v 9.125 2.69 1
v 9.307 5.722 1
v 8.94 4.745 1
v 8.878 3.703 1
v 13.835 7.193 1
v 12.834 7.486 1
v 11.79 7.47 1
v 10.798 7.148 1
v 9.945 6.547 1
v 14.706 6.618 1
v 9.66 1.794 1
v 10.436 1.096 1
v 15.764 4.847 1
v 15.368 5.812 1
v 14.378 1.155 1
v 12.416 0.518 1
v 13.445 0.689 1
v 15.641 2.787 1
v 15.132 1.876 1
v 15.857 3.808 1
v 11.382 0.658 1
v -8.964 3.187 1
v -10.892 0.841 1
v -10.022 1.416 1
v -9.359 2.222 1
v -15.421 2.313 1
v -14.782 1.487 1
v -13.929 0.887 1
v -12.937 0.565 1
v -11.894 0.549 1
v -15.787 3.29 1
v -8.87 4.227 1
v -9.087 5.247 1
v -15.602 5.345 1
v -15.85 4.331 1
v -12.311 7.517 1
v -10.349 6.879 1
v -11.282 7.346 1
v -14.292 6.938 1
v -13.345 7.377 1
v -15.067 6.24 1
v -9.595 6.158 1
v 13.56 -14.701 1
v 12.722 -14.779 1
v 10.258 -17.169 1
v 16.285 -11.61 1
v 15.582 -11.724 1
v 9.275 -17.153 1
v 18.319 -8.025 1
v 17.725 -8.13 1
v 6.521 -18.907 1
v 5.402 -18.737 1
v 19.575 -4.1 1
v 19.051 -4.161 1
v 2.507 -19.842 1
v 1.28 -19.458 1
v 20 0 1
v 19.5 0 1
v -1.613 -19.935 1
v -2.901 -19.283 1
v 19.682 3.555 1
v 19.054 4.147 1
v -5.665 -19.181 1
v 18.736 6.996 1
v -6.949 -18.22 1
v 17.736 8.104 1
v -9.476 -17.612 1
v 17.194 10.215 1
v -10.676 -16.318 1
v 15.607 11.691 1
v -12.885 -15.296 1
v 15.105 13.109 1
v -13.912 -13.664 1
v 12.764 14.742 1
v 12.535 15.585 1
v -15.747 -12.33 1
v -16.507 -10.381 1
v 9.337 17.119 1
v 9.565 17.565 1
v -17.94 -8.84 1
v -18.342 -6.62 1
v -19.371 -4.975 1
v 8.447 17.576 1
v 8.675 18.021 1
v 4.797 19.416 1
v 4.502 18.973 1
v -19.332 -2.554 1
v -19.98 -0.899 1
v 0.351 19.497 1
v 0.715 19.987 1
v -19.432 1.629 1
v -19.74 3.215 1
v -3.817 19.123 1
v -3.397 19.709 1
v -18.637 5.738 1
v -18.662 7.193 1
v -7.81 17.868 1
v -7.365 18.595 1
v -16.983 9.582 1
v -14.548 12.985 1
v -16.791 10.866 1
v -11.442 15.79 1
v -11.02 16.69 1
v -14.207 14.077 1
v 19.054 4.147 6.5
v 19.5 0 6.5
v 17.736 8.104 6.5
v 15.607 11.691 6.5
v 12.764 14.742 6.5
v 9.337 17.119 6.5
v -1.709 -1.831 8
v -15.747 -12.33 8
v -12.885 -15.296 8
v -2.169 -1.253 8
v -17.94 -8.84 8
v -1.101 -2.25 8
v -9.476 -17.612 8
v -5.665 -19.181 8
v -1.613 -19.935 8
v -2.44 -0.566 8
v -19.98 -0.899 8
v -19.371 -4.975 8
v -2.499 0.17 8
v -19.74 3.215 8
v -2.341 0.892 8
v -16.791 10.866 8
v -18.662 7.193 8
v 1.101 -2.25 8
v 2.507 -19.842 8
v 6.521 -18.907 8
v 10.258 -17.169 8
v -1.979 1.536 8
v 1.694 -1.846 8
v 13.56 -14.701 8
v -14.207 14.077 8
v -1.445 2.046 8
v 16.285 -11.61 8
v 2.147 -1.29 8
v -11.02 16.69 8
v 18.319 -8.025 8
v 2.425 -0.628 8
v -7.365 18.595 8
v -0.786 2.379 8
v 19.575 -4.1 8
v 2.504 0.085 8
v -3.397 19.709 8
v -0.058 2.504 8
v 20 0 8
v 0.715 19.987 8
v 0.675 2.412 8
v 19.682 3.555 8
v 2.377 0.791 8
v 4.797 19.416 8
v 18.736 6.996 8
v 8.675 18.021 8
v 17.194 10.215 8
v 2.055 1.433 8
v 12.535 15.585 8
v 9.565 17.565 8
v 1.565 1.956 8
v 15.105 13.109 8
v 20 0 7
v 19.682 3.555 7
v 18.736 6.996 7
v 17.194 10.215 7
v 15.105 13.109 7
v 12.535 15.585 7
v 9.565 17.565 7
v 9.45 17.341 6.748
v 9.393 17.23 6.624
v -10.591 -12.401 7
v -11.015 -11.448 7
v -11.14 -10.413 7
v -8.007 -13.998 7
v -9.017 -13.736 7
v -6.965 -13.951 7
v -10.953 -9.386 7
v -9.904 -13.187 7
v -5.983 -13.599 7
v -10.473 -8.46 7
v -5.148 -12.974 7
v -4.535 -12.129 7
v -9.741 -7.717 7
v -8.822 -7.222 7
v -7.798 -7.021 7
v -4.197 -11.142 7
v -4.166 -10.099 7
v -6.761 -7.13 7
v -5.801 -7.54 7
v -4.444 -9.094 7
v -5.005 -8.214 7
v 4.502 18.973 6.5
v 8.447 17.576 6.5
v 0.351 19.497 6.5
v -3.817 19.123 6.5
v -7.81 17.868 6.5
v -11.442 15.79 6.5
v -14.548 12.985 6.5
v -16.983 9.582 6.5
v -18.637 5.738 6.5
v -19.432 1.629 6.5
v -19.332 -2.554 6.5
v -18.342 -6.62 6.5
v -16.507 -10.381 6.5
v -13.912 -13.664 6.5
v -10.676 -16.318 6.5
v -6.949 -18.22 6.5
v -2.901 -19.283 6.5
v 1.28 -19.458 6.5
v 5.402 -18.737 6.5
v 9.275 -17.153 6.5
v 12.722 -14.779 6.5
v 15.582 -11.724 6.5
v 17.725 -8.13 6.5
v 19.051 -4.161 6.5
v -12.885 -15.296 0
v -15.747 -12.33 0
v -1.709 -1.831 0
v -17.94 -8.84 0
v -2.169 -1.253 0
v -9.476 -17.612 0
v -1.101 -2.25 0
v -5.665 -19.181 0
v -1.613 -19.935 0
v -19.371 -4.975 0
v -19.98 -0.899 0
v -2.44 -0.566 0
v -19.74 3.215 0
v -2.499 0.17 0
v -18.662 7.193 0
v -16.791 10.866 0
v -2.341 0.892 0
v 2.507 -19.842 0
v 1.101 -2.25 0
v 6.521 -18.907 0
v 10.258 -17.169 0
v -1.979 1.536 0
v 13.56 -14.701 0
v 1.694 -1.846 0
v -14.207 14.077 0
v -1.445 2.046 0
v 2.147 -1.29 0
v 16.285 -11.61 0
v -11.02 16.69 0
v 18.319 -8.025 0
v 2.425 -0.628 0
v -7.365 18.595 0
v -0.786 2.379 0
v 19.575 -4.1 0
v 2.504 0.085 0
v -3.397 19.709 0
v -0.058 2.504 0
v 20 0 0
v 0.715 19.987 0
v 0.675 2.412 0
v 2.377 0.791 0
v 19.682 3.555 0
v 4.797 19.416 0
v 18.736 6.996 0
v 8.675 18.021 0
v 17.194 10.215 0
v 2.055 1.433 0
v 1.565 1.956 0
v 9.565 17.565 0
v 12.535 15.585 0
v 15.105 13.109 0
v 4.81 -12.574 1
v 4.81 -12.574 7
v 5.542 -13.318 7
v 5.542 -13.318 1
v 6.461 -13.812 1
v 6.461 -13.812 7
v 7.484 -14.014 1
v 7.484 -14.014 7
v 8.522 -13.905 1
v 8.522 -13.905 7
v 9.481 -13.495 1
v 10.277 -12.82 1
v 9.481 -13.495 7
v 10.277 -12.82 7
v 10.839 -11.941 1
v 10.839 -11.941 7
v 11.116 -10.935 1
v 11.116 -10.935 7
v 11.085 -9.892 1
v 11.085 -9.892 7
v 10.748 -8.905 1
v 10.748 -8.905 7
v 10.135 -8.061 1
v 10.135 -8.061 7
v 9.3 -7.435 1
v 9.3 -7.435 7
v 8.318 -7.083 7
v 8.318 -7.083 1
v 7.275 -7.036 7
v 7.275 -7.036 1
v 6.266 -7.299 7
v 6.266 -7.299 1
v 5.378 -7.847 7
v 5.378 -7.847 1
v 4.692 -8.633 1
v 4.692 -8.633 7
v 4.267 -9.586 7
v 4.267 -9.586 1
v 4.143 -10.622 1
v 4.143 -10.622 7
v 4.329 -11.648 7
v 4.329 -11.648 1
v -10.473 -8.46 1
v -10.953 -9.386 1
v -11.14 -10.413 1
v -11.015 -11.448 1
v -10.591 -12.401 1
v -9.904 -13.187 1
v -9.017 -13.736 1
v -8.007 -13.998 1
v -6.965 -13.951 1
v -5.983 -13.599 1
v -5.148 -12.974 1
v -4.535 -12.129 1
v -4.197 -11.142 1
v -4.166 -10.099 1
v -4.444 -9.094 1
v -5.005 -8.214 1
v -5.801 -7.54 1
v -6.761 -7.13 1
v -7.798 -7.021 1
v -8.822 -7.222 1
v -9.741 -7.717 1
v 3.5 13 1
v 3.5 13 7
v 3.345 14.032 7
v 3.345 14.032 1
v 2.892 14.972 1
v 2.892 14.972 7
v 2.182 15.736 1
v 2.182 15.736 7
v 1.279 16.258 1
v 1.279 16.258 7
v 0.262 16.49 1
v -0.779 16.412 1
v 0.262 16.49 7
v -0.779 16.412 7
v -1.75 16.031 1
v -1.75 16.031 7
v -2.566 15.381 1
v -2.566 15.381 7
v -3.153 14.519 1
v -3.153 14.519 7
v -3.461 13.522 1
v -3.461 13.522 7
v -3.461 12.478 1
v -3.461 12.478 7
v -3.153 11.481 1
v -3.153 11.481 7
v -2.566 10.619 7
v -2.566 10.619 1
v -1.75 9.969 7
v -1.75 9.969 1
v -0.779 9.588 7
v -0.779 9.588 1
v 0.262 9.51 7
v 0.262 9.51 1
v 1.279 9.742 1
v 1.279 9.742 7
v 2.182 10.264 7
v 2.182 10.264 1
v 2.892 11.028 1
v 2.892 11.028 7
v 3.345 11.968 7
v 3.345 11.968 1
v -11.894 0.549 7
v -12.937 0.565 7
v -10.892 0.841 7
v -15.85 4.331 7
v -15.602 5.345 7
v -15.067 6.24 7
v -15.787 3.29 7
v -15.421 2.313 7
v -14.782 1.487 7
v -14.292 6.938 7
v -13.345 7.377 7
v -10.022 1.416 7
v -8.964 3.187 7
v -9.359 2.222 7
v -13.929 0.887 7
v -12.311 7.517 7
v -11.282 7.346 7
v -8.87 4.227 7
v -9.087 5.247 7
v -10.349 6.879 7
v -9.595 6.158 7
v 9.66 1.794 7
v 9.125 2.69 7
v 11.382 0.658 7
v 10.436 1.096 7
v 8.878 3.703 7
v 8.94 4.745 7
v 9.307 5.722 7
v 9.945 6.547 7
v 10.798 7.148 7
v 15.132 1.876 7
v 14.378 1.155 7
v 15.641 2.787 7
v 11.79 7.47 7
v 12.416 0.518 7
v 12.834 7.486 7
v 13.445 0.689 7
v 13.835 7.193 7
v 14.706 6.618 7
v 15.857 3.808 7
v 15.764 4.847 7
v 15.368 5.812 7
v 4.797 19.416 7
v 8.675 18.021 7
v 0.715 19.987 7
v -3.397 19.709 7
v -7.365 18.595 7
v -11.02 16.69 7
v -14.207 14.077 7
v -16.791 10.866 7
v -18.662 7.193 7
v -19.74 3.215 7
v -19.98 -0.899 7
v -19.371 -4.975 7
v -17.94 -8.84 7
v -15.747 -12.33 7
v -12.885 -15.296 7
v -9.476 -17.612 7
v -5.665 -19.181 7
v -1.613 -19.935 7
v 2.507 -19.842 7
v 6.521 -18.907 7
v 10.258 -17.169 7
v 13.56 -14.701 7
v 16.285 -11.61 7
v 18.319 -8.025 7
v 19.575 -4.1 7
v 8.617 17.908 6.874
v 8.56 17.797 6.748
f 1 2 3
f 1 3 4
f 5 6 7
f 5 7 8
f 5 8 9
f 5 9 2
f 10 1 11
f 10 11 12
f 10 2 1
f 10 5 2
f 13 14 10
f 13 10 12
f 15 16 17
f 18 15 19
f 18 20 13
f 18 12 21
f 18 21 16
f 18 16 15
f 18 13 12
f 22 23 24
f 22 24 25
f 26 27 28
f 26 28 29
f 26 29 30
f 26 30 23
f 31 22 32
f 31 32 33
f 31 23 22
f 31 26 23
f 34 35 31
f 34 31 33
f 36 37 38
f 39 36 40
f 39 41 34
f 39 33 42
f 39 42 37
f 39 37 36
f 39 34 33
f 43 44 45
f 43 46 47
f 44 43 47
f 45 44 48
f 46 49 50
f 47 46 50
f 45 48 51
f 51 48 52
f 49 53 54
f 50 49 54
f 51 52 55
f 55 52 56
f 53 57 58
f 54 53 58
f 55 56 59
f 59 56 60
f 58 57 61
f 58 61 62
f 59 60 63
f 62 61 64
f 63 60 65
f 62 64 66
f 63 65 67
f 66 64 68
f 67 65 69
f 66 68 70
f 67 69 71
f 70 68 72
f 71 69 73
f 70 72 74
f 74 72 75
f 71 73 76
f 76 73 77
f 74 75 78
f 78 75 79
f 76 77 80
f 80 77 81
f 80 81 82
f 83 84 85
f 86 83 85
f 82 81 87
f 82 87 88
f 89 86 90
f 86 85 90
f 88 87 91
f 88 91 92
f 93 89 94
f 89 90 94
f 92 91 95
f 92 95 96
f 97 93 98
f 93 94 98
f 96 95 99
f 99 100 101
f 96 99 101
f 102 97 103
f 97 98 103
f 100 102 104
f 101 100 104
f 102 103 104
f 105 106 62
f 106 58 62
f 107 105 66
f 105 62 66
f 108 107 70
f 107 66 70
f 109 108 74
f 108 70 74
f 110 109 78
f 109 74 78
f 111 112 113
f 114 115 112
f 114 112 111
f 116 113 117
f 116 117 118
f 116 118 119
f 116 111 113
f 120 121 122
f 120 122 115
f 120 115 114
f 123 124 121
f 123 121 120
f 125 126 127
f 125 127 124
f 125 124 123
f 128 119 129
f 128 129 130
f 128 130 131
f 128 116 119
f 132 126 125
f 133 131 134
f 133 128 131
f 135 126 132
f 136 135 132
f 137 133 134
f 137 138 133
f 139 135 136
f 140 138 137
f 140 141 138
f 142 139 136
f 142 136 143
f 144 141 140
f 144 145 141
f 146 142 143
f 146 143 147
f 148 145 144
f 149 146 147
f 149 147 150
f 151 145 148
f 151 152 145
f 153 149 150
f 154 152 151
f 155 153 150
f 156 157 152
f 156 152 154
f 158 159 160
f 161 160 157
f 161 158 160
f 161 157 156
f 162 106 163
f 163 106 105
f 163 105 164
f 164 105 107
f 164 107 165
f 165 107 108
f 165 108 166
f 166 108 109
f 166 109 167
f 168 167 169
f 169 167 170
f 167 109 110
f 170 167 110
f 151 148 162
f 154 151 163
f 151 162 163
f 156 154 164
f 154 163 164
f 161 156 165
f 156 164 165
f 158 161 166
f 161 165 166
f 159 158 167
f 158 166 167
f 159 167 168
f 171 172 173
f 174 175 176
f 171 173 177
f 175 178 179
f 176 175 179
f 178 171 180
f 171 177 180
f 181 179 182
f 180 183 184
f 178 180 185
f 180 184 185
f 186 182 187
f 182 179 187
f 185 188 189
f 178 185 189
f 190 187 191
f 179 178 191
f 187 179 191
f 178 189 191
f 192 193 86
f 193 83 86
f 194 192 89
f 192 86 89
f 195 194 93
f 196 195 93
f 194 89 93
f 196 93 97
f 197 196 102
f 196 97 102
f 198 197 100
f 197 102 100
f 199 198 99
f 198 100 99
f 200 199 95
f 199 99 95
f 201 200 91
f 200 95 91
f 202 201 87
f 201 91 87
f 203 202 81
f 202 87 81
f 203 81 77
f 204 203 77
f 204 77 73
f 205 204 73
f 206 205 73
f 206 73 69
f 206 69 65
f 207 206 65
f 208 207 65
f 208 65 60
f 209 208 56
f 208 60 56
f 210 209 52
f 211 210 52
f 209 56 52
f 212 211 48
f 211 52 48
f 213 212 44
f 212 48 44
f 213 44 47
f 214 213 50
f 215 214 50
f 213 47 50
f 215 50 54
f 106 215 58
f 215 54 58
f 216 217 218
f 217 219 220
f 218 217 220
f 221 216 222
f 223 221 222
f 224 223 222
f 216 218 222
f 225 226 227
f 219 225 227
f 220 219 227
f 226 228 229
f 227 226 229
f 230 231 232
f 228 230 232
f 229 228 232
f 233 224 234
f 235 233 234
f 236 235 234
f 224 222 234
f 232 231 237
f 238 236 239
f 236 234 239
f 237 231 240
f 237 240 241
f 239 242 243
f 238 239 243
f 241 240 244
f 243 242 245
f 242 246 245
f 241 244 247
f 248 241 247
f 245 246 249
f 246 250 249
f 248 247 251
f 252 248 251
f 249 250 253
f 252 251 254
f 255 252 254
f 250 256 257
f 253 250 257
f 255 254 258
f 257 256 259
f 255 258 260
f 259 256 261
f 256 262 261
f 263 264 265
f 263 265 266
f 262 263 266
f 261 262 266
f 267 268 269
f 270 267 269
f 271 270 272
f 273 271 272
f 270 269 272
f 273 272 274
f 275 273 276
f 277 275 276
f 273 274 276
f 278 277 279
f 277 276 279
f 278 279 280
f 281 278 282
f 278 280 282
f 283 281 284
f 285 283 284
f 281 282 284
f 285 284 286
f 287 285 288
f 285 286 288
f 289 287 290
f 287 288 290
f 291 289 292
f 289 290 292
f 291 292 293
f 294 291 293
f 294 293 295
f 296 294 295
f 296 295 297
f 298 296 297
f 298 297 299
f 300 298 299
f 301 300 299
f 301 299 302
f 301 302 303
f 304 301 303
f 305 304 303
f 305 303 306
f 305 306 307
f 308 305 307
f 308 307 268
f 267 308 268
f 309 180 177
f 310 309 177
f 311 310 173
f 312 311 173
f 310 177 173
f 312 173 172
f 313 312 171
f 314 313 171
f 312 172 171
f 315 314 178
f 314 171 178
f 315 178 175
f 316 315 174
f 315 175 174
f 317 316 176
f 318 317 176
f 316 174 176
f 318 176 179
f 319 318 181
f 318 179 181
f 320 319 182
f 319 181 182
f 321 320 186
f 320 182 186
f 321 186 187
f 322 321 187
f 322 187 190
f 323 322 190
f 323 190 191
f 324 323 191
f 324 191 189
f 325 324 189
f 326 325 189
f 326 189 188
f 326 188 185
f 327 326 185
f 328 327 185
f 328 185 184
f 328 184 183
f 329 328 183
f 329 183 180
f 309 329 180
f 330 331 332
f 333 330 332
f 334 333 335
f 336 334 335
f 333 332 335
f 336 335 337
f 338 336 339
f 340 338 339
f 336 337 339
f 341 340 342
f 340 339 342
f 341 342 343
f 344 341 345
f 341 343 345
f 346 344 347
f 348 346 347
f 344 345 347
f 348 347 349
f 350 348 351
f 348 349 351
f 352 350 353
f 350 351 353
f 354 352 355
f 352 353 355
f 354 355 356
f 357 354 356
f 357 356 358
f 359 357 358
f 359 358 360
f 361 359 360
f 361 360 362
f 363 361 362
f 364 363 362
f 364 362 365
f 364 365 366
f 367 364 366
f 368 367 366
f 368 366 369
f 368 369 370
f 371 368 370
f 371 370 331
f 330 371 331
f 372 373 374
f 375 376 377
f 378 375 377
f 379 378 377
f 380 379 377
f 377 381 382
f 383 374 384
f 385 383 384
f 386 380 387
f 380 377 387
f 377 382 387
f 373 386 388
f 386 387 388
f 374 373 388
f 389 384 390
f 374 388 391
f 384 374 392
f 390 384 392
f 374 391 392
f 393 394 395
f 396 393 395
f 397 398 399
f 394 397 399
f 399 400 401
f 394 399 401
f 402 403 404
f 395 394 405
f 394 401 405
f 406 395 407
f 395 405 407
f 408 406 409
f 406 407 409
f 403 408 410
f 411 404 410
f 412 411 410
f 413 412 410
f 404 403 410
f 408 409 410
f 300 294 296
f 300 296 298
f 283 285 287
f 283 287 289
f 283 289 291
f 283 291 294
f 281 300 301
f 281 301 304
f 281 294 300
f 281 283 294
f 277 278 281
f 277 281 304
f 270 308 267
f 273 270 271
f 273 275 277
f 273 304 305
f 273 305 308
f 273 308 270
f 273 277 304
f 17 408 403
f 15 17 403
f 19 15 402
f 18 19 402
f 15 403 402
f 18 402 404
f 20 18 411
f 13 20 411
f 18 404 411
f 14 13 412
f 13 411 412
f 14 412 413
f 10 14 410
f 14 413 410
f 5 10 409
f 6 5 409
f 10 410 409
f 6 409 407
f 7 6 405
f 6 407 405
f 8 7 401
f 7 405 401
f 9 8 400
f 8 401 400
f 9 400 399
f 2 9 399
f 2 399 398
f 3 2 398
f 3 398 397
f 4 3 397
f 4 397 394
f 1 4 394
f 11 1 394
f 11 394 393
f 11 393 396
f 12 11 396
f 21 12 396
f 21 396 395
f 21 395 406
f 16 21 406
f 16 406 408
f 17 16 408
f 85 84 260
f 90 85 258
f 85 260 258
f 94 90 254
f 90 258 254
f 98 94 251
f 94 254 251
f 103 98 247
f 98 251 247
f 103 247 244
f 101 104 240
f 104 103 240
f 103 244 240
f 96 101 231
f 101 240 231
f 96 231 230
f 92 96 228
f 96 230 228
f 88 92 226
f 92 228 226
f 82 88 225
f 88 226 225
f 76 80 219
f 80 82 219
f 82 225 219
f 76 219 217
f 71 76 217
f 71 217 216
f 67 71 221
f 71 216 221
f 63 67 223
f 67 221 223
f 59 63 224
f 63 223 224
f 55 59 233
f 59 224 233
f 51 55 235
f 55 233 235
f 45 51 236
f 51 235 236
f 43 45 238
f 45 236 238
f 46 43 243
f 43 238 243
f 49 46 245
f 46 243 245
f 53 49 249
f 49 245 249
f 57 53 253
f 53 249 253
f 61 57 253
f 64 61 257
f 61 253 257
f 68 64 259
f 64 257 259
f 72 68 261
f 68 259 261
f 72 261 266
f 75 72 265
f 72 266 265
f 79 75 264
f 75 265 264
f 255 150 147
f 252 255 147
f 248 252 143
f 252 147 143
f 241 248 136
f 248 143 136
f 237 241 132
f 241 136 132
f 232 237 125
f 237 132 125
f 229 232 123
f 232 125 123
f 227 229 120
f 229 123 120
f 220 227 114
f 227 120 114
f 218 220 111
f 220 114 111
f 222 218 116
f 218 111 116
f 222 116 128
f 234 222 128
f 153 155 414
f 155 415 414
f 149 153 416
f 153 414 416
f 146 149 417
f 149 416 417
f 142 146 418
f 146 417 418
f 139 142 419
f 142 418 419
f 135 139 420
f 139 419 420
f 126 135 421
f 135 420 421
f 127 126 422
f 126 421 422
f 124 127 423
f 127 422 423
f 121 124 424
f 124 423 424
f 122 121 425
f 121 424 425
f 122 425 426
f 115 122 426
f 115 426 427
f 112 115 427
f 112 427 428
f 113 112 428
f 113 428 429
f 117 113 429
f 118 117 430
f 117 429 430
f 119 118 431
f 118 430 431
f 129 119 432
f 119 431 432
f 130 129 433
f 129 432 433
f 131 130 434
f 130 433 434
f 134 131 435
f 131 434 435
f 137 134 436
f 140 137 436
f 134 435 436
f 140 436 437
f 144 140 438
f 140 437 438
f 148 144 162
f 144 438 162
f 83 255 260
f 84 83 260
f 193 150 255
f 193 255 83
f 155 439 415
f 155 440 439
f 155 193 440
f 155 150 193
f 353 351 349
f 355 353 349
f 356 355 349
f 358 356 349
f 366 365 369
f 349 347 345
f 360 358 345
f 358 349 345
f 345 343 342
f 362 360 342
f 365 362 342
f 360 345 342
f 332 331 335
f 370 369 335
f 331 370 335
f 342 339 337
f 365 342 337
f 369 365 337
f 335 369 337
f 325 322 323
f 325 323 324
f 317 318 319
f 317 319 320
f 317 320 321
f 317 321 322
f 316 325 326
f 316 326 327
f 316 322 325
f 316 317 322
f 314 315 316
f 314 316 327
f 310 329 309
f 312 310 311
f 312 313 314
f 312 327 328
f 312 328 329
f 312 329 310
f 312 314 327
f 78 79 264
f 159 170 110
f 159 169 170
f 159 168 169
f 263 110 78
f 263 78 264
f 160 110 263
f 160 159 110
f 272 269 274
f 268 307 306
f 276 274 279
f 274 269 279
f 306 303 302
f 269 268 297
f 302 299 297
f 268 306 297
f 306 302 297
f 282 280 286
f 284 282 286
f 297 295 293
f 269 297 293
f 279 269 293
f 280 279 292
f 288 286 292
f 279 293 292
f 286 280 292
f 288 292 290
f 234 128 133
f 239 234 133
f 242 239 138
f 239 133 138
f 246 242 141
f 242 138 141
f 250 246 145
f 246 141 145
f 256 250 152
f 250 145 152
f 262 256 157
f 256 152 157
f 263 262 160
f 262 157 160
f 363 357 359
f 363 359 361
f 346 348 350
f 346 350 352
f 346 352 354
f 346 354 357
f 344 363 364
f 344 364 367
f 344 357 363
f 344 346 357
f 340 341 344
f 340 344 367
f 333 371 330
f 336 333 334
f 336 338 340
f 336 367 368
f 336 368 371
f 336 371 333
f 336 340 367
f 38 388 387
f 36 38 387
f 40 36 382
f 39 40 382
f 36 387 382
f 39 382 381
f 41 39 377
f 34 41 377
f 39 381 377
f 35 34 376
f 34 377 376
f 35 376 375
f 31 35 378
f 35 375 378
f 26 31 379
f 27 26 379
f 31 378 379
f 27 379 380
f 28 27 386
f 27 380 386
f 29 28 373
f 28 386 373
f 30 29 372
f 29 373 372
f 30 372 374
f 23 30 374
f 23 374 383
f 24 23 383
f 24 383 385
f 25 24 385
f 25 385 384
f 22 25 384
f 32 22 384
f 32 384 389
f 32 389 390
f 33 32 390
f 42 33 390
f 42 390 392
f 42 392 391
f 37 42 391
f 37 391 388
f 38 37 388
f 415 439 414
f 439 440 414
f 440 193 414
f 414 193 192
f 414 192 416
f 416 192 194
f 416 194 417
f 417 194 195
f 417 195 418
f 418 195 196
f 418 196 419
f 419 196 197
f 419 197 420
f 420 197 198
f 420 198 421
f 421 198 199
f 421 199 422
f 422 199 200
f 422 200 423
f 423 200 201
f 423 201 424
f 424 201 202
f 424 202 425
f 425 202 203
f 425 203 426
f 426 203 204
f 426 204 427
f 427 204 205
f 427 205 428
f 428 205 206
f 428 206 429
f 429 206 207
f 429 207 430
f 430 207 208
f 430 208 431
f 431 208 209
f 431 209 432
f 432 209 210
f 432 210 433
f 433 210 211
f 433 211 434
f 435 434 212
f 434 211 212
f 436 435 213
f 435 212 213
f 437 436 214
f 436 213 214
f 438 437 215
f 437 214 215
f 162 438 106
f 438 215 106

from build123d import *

# Parameters (mm, degrees)
SKETCH_R           = 20
PAD_DEPTH          = 8
POCKET_DEPTH       = 8.001
SKETCH003_R        = 3.5
POCKET001_DEPTH    = 7
POLARPATTERN_COUNT = 5
SKETCH005_R        = 1.995724
POCKET002_DEPTH    = 0.5
SKETCH007_R        = 17.476315
SKETCH007_R_2      = 3.403878
PAD001_DEPTH       = 1
POCKET003_DEPTH    = 8.001


with BuildPart() as part:
    # Sketch → Pad (new body)
    with BuildSketch(Plane.XY):
        Circle(SKETCH_R)
    extrude(amount=PAD_DEPTH)

    # Sketch001 (on Face3 of Pad) → Pocket (cut, through all)
    with BuildSketch(Plane.XY.offset(8)):
        with BuildLine():
            ThreePointArc((1.101147, -2.25), (0, 2.505), (-1.101147, -2.25))
            Line((-1.101147, -2.25), (1.101147, -2.25))
        make_face()
    extrude(amount=-POCKET_DEPTH, mode=Mode.SUBTRACT)

    # Sketch002 → Groove (revolve, cut)
    with BuildSketch(Plane.XZ):
        Polygon((19.5, 6.5), (19.5, 1), (23, 1), (23, 10), align=None)
    revolve(axis=Axis((0, 0, 0), (0, 0, 1)), mode=Mode.SUBTRACT)

    # Sketch003 (on Face3 of Groove) → Pocket001 (cut)
    with BuildSketch(Plane.XY.offset(8)):
        with Locations((0, 13)):
            Circle(SKETCH003_R)
    pocket001 = extrude(amount=-POCKET001_DEPTH, mode=Mode.SUBTRACT)

    # PolarPattern: Pocket001 ×5 about axis
    polarpattern_axis = Axis((0, 0, 8), (0, 0, 1))
    for i in range(1, POLARPATTERN_COUNT):
        add(pocket001.rotate(polarpattern_axis, i * 360 / POLARPATTERN_COUNT), mode=Mode.SUBTRACT)

    # Sketch005 (on Face3 of PolarPattern) → Pocket002 (cut)
    with BuildSketch(Plane.XY.offset(8)):
        with Locations((-5.881012, 7.168965)):
            Circle(SKETCH005_R)
    extrude(amount=-POCKET002_DEPTH, mode=Mode.SUBTRACT)

    # Sketch007 (on Face3 of Pocket002) → Pad001 (join)
    with BuildSketch(Plane.XY.offset(8)):
        Circle(SKETCH007_R)
        Circle(SKETCH007_R_2, mode=Mode.SUBTRACT)
    extrude(amount=-PAD001_DEPTH)

    # Sketch008 (on Face5 of Pad001) → Pocket003 (cut, through all)
    with BuildSketch(Plane.XY.offset(8)):
        Polygon((0, 0), (-0.444954, 0.22807), (10.469651, 21.521968), (11.359559, 21.065828), (0.444954, -0.22807), align=None)
    extrude(amount=-POCKET003_DEPTH, mode=Mode.SUBTRACT)


solid = part.part
